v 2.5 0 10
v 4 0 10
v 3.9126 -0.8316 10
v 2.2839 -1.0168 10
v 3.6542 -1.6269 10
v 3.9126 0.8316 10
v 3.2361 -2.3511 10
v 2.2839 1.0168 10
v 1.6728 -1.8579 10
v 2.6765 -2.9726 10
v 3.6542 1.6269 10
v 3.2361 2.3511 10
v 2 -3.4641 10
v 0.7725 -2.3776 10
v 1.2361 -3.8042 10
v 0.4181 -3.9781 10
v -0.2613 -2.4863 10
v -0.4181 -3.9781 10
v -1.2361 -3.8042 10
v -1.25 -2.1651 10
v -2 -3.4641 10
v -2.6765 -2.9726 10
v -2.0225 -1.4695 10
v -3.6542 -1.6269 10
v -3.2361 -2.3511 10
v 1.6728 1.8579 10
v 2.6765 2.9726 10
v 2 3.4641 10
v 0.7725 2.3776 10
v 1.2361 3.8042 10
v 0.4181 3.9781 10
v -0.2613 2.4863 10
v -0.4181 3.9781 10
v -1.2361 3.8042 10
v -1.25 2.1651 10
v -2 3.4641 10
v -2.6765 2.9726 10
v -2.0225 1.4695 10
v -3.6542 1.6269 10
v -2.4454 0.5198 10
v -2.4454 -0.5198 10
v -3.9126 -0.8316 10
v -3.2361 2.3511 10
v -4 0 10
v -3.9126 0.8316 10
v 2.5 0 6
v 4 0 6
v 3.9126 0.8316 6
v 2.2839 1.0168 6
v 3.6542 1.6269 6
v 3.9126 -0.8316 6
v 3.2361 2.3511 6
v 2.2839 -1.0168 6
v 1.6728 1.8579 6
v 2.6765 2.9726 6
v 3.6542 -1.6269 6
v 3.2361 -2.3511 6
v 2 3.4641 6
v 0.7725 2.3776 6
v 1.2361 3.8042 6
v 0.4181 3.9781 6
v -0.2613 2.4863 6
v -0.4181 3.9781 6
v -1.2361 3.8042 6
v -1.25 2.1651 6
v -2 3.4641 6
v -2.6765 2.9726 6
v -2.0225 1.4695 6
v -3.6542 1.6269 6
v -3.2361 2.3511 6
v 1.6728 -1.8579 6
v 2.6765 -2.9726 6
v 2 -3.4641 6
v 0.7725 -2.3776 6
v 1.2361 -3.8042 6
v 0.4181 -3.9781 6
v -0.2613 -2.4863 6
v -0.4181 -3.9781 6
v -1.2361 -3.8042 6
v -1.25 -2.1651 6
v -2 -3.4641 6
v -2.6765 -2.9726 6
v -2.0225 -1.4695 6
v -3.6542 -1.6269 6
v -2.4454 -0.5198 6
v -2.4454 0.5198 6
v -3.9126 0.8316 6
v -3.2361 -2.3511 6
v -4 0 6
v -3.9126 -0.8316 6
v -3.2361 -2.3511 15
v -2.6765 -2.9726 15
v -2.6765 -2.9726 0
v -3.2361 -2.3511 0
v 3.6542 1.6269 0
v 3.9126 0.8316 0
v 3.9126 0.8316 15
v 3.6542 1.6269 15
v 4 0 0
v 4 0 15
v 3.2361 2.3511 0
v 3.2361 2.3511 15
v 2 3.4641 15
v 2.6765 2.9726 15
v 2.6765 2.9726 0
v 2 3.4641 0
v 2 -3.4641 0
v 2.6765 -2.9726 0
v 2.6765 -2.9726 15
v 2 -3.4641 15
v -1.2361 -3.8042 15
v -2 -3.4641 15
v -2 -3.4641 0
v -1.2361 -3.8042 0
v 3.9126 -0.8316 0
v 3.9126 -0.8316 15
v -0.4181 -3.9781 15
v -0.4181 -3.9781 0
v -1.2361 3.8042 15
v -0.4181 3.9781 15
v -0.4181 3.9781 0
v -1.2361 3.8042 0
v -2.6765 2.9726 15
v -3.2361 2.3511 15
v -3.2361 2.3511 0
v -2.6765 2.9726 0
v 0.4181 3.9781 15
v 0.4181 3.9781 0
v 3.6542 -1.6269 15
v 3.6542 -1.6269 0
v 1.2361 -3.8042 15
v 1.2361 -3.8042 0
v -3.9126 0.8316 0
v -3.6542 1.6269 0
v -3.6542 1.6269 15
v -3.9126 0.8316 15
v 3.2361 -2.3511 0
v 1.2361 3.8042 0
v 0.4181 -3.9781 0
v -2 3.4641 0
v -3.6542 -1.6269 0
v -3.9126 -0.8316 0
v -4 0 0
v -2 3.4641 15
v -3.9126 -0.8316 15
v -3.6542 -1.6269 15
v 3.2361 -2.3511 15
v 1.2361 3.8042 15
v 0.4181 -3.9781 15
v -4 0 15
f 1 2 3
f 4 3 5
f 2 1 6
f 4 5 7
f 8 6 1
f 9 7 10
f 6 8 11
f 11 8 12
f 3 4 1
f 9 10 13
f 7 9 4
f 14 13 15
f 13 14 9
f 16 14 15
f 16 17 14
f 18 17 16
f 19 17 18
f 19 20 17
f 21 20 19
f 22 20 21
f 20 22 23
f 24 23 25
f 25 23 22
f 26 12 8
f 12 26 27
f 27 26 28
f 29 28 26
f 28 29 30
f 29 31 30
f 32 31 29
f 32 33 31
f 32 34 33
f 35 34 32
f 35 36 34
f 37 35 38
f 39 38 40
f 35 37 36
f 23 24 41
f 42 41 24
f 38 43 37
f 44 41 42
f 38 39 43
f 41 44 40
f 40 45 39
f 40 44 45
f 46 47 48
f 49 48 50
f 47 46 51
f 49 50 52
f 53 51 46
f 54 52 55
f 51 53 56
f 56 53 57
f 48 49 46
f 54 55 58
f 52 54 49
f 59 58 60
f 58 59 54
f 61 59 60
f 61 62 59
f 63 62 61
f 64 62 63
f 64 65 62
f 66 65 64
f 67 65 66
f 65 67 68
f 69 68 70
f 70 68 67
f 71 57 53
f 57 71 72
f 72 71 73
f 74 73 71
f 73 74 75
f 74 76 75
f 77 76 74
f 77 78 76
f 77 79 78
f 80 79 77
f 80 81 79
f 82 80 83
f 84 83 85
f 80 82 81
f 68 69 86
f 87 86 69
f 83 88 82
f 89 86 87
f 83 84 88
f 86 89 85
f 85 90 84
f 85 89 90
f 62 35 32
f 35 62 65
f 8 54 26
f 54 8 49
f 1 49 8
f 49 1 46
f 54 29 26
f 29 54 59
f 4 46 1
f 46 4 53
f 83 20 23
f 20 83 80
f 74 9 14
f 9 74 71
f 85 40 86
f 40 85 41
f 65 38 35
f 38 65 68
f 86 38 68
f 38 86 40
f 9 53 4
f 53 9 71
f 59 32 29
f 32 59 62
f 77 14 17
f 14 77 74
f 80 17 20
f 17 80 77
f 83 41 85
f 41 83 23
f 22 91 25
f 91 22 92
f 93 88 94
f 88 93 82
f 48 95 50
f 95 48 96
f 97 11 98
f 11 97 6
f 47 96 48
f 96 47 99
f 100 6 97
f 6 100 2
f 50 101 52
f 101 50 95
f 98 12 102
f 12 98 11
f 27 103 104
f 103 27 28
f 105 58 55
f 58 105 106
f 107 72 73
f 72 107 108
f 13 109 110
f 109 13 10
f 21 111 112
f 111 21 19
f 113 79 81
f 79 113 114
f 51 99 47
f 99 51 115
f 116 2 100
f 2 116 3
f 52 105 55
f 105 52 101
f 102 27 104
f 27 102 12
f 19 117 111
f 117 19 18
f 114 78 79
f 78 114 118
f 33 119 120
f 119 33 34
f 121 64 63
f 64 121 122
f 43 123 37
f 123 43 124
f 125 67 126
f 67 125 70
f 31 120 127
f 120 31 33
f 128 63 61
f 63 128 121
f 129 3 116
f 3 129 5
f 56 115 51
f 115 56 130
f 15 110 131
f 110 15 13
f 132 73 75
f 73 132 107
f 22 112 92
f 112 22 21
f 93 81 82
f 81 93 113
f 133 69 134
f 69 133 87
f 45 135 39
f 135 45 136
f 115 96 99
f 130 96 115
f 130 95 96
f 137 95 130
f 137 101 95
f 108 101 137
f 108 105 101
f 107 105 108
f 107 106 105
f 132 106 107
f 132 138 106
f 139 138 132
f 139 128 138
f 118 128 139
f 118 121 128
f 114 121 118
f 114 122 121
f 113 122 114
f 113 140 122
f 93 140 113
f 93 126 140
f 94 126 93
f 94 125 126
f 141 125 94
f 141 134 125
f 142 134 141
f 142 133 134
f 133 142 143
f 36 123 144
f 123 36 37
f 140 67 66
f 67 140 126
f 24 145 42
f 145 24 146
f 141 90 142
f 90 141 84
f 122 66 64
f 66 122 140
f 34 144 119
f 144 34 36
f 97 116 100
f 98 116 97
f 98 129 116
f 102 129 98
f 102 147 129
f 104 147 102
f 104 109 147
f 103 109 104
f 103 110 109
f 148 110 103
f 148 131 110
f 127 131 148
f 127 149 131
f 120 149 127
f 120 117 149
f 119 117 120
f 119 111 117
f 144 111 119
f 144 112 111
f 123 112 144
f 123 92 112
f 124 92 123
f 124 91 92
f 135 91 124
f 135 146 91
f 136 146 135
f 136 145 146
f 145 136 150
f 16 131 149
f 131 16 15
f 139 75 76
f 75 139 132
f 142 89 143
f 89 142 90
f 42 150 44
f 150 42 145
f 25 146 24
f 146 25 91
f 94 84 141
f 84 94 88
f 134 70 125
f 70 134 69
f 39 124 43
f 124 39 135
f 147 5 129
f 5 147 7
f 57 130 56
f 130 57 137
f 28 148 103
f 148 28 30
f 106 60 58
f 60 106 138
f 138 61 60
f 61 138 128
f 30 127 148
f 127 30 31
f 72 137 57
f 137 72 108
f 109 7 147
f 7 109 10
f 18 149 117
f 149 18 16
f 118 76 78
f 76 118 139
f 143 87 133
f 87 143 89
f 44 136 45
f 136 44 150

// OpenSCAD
module Cabo_Hilos(){
    difference(){
        cylinder(h=15,r=8/2,$fn=30);
        translate([0,0,8])
            difference(){
                cylinder(h=4,r=5,$fn=15,center=true);
                cylinder(h=4,r=2.5,$fn=15,center=true);
        }   
        
    }
}

Cabo_Hilos();
